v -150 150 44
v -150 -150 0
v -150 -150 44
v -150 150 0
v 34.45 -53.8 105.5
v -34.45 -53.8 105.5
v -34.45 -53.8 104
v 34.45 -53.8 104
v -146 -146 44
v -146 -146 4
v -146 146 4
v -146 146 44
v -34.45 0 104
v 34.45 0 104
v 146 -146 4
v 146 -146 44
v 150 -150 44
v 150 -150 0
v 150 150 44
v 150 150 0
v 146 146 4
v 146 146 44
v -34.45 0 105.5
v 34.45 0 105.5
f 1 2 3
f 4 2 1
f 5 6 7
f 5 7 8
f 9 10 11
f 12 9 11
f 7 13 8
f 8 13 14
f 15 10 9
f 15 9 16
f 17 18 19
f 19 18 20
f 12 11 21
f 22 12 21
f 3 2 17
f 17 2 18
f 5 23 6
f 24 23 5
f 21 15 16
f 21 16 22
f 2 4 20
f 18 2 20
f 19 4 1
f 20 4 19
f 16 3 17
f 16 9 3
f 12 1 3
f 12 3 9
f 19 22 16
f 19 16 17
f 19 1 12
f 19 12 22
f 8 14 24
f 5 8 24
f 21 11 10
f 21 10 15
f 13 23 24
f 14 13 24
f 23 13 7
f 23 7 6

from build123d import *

# Parameters (mm, degrees)
F0_W     = 300
F0_H     = 300
F1_DEPTH = 4
F2_W     = 300
F2_H     = 300
F2_W_2   = 292
F2_H_2   = 292
F3_DEPTH = 40
F4_W     = 68.9
F4_H     = 1.5
F5_DEPTH = 53.8


with BuildPart() as f1:
    # F0 (on Top) → F1 (new body)
    with BuildSketch(Plane.XY):
        Rectangle(F0_W, F0_H)
    extrude(amount=F1_DEPTH)

    # F2 (on face) → F3 (join)
    with BuildSketch(Plane.XY.offset(4)):
        Rectangle(F2_W, F2_H)
        Rectangle(F2_W_2, F2_H_2, mode=Mode.SUBTRACT)
    extrude(amount=F3_DEPTH)


with BuildPart() as f5:
    # F4 (on Front) → F5 (new body)
    with BuildSketch(Plane.XZ):
        with Locations((0, 104.75)):
            Rectangle(F4_W, F4_H)
    extrude(amount=F5_DEPTH)


solid = Compound([f1.part, f5.part])
